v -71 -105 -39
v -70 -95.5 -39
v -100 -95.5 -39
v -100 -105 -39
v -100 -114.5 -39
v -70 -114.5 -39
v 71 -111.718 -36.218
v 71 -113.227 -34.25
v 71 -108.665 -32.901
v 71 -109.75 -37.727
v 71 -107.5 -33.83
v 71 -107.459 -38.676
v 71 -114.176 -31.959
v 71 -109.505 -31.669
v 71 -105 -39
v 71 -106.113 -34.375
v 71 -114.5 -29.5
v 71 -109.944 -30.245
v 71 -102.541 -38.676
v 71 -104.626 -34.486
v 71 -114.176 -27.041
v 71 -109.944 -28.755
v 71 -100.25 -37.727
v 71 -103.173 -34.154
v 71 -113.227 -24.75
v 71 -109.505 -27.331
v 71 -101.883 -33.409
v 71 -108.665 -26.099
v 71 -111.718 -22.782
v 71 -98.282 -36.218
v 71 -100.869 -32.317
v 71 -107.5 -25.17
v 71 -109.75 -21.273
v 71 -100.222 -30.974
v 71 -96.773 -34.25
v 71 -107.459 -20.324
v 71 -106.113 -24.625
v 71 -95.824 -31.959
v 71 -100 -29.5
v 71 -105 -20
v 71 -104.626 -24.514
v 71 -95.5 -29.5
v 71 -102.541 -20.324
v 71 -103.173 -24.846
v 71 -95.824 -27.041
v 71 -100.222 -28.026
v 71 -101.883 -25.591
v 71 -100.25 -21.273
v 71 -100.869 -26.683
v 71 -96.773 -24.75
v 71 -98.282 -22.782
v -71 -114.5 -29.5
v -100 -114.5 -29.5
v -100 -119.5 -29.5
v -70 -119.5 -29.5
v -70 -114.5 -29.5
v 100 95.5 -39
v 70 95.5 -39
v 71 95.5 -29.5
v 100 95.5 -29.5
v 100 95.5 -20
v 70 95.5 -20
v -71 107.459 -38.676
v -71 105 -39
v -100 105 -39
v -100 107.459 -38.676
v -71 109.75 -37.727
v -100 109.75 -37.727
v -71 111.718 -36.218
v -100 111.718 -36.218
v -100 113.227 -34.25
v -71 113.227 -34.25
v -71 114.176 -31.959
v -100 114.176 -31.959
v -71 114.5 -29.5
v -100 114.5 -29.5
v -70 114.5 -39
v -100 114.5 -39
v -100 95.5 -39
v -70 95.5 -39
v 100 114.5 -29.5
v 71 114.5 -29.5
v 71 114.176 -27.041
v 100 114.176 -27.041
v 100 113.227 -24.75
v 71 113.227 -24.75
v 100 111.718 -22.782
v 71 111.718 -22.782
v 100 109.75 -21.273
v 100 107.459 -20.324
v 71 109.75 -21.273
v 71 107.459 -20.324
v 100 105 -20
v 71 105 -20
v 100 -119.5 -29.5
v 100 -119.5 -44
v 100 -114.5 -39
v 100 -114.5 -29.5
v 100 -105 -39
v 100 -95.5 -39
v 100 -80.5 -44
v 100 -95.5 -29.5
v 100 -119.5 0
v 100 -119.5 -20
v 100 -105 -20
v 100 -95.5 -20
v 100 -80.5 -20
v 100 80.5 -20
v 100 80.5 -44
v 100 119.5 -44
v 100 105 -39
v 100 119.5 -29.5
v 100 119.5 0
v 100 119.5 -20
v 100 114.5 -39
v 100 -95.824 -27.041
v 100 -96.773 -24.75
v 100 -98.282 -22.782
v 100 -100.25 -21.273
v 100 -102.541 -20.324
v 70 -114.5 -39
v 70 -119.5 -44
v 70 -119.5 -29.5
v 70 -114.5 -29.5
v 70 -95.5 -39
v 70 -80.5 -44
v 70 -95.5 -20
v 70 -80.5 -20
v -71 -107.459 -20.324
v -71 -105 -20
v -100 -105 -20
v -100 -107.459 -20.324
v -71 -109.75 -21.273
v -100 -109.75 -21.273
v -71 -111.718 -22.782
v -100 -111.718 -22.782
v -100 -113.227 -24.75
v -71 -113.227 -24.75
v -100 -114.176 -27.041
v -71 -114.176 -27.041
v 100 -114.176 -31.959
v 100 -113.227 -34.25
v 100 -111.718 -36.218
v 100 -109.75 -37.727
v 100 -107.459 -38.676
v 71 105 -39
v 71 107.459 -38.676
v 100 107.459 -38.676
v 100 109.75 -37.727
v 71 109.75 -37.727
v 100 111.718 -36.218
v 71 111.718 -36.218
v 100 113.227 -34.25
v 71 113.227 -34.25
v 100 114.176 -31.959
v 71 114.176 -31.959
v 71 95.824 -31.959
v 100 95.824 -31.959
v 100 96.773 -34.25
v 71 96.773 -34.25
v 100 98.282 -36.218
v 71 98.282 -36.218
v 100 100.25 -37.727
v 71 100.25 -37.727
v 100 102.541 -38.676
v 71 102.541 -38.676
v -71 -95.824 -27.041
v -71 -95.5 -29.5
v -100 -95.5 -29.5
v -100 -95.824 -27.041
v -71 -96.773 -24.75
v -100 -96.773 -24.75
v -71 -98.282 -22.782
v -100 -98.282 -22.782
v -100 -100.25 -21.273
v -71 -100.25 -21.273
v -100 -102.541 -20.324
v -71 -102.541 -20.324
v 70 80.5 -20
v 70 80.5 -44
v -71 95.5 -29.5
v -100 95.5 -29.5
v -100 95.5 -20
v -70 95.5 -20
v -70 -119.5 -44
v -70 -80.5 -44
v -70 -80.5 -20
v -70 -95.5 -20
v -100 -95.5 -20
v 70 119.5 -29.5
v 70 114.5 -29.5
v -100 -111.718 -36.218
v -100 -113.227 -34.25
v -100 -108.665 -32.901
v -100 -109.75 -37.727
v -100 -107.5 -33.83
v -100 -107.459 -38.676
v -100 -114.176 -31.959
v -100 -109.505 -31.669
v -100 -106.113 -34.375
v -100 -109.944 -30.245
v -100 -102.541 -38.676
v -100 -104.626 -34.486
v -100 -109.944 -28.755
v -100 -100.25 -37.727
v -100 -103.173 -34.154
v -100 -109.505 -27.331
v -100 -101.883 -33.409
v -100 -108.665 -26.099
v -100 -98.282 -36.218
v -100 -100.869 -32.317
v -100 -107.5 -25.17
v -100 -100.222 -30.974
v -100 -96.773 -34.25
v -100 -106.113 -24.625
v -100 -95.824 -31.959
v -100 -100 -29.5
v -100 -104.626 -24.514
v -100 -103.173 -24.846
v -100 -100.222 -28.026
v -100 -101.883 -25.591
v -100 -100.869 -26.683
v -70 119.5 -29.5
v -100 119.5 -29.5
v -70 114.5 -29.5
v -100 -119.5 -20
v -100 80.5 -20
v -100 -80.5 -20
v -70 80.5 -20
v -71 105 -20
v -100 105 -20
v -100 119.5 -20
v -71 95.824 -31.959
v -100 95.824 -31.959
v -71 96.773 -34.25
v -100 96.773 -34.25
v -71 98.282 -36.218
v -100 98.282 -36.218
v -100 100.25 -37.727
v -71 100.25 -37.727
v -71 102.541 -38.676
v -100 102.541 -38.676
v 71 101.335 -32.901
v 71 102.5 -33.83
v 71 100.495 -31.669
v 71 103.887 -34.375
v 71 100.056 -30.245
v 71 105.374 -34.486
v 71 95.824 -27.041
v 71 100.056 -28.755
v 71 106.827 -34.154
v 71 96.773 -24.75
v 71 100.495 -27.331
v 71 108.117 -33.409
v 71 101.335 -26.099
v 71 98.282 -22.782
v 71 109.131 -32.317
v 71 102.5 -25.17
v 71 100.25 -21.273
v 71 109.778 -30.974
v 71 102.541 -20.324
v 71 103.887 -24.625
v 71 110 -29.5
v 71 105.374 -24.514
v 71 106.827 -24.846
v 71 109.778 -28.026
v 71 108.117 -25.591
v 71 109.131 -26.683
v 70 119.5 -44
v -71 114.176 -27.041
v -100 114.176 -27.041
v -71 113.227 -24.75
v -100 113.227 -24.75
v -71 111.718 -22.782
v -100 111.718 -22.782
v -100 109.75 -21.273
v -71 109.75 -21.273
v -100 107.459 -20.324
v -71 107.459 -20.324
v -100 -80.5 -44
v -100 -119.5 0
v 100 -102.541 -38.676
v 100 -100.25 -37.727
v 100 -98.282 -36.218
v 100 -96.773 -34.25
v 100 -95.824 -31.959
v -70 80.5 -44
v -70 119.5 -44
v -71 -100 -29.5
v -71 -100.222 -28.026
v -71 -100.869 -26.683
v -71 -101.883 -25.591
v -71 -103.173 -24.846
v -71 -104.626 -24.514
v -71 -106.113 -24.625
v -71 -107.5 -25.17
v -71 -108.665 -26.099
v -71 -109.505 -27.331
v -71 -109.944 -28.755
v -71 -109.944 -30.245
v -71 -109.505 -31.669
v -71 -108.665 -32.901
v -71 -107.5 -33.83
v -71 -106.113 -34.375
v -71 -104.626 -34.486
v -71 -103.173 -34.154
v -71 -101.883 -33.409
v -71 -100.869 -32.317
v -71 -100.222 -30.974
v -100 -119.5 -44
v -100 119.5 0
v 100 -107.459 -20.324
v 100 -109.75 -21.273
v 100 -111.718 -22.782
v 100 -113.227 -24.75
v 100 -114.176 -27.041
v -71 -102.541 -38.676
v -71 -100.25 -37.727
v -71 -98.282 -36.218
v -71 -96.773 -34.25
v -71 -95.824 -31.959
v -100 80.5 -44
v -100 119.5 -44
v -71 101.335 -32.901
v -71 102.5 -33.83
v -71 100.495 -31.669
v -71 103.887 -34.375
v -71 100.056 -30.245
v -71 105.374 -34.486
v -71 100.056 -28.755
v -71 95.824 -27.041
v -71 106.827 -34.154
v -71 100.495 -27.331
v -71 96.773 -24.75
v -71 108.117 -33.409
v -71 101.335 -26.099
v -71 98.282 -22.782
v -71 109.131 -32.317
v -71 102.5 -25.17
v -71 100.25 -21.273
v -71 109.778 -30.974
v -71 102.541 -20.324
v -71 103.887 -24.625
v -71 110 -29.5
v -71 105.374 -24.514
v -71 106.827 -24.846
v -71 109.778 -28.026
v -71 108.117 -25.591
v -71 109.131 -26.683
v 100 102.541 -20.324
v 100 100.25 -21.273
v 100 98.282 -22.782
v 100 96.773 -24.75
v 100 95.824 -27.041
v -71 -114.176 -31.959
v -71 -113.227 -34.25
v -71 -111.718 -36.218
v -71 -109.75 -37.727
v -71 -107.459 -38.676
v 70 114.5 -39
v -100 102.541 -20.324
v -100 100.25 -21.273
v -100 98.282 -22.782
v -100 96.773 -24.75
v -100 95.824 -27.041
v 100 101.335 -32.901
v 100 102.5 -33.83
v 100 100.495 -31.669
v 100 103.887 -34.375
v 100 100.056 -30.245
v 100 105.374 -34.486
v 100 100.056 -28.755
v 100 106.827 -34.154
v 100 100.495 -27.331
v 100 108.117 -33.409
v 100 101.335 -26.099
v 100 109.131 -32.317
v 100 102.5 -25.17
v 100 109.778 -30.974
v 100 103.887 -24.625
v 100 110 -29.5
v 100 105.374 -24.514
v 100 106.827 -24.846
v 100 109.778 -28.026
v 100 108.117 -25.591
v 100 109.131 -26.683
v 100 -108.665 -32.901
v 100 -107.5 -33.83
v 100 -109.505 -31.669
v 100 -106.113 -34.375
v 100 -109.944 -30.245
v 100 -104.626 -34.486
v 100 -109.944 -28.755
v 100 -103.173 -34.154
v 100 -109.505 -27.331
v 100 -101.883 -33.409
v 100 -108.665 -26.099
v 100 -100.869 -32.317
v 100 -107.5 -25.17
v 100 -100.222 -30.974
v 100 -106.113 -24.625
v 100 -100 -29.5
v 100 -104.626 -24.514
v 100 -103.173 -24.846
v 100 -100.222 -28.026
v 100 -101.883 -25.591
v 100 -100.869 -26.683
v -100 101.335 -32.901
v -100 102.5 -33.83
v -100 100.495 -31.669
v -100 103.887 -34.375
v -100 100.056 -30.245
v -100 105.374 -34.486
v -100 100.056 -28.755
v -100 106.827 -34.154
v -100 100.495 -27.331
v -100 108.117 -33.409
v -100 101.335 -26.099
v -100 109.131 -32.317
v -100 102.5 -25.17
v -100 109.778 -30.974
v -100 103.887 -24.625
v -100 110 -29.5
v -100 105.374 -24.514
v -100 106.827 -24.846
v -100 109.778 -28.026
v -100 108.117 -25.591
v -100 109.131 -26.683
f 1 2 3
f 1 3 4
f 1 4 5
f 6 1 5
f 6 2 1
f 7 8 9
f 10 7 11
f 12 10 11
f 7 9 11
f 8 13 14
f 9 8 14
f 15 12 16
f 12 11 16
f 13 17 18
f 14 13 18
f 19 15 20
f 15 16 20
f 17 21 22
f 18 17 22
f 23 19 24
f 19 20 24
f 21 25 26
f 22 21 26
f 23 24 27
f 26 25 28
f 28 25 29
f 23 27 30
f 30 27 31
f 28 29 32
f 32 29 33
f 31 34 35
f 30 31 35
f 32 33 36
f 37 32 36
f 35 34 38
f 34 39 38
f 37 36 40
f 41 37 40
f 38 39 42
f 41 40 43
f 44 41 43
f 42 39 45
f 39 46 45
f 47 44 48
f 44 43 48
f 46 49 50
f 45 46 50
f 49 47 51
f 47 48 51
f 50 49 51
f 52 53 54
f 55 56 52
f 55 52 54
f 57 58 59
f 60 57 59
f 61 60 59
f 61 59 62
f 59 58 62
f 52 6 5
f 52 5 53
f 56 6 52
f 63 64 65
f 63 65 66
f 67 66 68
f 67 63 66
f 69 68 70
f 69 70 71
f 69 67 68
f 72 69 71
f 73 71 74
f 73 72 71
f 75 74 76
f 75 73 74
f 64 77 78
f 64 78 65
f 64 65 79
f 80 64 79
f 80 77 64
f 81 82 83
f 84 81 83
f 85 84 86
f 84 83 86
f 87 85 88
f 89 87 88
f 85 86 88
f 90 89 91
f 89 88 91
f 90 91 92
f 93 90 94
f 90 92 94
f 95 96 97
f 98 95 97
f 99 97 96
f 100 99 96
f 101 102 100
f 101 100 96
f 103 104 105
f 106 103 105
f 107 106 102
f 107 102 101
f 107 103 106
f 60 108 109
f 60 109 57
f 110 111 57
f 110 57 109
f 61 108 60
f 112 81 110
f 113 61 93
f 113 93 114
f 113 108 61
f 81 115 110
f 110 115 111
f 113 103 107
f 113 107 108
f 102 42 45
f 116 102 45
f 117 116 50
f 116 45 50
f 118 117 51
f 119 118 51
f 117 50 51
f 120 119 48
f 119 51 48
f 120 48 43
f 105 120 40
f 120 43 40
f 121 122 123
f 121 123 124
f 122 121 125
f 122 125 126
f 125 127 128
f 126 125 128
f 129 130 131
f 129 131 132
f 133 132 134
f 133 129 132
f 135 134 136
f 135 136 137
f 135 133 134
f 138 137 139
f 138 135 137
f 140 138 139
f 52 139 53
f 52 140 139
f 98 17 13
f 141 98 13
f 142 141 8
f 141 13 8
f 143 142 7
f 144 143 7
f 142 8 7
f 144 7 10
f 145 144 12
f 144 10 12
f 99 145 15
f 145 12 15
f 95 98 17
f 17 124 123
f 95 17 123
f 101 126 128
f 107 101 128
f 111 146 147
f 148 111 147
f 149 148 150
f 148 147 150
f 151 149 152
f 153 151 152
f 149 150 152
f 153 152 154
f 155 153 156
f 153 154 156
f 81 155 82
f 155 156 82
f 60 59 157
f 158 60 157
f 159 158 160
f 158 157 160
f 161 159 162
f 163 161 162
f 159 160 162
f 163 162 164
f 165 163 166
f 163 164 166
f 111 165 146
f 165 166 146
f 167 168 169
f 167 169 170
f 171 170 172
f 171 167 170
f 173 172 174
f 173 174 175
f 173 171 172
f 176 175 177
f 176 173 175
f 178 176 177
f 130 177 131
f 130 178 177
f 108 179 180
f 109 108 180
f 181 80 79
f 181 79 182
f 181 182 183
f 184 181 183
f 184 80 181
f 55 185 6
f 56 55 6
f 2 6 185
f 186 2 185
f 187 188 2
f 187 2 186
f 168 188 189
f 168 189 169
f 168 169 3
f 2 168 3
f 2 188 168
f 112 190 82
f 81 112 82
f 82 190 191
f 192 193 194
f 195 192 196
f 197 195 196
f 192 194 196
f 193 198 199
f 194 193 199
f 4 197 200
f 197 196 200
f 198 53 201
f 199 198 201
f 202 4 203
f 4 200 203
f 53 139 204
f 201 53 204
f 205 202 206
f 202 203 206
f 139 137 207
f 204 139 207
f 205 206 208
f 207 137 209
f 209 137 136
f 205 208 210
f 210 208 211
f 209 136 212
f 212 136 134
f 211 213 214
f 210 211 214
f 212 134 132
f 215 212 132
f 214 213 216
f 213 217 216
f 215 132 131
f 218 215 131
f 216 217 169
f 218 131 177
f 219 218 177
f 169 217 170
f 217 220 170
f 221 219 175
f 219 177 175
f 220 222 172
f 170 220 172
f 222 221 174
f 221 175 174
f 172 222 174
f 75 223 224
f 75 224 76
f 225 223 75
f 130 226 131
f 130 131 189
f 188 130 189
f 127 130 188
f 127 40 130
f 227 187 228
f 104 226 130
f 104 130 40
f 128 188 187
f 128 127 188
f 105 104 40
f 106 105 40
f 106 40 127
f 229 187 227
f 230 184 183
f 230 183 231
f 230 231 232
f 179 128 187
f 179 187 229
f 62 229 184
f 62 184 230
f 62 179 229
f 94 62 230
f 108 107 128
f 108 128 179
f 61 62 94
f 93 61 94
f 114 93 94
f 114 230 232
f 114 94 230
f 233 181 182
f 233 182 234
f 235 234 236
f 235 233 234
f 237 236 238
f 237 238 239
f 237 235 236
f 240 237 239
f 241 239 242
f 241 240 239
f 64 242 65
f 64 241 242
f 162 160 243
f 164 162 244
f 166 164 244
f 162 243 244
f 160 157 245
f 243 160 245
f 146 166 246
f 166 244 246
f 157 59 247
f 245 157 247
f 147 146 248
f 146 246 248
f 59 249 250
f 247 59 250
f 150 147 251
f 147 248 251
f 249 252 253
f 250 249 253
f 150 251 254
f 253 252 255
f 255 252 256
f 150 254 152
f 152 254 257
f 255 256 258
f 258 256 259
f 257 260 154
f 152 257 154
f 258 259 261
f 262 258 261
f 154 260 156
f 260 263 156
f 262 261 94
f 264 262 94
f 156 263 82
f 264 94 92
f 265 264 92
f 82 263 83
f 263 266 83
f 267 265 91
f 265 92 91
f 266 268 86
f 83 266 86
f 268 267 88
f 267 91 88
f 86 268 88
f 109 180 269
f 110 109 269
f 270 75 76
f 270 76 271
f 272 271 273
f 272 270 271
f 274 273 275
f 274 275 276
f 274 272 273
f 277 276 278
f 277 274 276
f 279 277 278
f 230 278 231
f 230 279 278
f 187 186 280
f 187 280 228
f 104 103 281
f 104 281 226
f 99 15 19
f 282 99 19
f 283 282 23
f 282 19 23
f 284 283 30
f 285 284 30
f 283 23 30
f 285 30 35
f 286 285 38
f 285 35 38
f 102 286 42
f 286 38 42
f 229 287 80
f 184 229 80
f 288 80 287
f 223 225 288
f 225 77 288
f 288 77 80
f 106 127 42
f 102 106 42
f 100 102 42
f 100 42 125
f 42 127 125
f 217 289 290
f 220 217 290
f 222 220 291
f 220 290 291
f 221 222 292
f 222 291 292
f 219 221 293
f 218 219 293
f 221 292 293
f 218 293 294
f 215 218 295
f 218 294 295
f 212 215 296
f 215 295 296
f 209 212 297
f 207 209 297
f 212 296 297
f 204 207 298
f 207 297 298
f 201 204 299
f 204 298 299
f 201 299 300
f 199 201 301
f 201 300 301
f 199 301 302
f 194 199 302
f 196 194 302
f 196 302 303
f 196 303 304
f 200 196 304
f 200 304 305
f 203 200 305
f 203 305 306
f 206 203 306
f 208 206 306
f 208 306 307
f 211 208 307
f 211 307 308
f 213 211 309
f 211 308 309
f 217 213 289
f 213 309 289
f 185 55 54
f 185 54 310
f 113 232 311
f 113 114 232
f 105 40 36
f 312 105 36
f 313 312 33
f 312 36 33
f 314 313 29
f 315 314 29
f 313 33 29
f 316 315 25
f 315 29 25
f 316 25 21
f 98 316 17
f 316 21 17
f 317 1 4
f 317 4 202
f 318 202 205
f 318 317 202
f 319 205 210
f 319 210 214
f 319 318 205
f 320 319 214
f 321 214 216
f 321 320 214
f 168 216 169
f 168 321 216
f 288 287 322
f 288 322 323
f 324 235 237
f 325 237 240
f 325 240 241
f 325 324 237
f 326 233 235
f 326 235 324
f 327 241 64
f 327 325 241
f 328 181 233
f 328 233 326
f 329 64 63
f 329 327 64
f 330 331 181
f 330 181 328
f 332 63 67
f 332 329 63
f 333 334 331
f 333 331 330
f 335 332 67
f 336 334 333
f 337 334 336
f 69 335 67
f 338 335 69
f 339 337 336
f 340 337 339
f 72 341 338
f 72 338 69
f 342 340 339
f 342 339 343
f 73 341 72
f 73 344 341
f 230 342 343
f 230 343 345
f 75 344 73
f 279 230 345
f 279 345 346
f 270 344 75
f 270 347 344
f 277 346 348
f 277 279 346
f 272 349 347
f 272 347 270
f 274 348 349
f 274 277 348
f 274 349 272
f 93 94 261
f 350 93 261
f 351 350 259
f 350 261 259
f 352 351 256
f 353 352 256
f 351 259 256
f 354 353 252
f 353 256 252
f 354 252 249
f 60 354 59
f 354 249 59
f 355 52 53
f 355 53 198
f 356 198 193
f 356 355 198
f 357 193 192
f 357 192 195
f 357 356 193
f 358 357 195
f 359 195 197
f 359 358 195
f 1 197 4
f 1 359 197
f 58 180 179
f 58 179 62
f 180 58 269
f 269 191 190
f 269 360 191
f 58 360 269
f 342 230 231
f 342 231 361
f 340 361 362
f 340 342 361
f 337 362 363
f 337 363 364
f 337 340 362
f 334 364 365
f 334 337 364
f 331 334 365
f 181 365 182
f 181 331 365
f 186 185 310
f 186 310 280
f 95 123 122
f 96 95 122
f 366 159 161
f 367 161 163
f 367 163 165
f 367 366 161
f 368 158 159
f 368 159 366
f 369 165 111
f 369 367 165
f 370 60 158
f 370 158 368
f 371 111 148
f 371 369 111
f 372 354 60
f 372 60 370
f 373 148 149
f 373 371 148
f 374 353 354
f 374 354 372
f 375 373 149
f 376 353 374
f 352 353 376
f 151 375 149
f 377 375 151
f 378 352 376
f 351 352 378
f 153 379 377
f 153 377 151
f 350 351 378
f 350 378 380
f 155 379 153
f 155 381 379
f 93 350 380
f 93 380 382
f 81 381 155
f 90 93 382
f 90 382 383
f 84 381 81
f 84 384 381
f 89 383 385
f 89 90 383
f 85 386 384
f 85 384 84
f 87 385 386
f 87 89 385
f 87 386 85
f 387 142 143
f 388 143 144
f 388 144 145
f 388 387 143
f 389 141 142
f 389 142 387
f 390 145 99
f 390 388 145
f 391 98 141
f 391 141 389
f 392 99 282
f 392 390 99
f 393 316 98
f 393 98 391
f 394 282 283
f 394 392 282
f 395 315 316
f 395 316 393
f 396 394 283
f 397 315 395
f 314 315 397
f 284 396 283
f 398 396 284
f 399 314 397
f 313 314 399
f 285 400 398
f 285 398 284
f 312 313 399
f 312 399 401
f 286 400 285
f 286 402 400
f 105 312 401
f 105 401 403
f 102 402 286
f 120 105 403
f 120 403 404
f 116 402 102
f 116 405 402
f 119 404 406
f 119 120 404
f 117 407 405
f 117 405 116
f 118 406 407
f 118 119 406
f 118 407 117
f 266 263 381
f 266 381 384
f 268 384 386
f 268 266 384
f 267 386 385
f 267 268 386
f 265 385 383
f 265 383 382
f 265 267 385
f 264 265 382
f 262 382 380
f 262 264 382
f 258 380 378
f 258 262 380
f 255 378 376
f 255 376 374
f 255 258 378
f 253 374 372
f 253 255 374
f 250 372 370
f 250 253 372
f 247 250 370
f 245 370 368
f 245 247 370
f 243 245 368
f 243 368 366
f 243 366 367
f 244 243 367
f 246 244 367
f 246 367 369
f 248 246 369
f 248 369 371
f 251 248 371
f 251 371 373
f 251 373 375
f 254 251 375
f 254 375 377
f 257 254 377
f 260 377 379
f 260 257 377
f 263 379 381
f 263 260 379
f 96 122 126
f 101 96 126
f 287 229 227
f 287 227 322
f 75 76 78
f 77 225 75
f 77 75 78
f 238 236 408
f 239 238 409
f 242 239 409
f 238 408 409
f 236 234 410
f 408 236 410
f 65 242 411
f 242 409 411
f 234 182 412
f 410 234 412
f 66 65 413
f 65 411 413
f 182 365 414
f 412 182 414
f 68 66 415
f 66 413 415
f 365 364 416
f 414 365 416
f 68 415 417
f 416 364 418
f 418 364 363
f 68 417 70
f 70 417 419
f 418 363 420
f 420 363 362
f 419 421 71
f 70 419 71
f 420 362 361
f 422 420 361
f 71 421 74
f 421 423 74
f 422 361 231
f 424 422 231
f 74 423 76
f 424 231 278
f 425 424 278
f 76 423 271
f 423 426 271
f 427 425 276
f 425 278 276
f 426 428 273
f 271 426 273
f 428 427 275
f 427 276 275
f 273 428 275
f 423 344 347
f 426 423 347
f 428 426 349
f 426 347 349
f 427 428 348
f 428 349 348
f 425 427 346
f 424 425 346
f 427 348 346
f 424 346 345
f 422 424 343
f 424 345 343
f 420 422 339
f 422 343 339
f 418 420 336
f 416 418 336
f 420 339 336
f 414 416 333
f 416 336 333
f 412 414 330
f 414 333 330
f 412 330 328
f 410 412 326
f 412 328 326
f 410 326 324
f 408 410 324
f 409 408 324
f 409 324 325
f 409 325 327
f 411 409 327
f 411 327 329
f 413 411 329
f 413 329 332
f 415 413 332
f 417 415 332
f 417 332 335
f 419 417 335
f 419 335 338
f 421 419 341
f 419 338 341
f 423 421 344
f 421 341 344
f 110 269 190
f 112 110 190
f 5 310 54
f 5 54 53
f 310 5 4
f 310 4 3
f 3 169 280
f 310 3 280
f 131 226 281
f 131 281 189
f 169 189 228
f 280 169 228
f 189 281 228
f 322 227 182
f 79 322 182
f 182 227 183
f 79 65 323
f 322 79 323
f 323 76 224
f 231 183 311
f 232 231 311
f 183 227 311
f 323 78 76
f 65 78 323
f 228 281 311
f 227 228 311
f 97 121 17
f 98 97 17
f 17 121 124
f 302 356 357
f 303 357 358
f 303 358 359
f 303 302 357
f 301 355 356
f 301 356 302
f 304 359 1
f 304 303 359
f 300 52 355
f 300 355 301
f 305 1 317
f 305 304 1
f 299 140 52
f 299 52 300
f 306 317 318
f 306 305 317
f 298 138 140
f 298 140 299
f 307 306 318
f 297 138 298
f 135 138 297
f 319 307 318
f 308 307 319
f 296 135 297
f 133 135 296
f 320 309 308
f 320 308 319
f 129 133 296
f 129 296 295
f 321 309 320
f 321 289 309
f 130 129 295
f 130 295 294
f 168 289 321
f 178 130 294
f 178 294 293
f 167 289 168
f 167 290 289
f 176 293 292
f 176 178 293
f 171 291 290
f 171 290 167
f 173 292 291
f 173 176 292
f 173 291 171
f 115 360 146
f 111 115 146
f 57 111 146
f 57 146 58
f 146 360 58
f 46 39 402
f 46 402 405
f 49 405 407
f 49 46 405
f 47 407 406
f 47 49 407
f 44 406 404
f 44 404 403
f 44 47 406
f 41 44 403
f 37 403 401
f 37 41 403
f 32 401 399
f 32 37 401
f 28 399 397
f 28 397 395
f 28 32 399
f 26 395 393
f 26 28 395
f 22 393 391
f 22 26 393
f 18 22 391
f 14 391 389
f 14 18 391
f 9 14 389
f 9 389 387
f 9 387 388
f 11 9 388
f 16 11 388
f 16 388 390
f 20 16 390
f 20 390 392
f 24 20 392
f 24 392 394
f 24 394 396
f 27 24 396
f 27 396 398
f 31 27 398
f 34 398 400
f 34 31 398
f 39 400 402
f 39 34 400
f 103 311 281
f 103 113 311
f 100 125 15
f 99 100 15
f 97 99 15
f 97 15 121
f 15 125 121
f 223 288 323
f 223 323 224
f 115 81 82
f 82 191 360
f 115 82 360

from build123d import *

# Parameters (mm, degrees)
F1_DEPTH = 100
F2_START = 71
F0_R     = 5
F2_DEPTH = 29
F3_START = 70
F3_DEPTH = 30


with BuildPart() as f1:
    # F0 (on Right) → F1 (new body, symmetric)
    with BuildSketch(Plane.YZ):
        Polygon((119.5, 0), (-119.5, 0), (-119.5, -20), (-105, -20), (-95.5, -20), (-80.5, -20), (80.5, -20), (95.5, -20), (105, -20), (119.5, -20), align=None)
    extrude(amount=F1_DEPTH, both=True)

    # F0 (on Right) → F2 (join)
    with BuildSketch(Plane.YZ.offset(F2_START)):
        with BuildLine():
            ThreePointArc((-95.5, -29.5), (-98.2824855787, -22.7824855787), (-105, -20))
            ThreePointArc((-105, -20), (-111.7175144213, -22.7824855787), (-114.5, -29.5))
            ThreePointArc((-114.5, -29.5), (-111.7175144213, -36.2175144213), (-105, -39))
            ThreePointArc((-105, -39), (-98.2824855787, -36.2175144213), (-95.5, -29.5))
        make_face()
        with Locations((-105, -29.5)):
            Circle(F0_R, mode=Mode.SUBTRACT)
        with BuildLine():
            ThreePointArc((114.5, -29.5), (111.7175144213, -22.7824855787), (105, -20))
            ThreePointArc((105, -20), (98.2824855787, -22.7824855787), (95.5, -29.5))
            ThreePointArc((95.5, -29.5), (98.2824855787, -36.2175144213), (105, -39))
            ThreePointArc((105, -39), (111.7175144213, -36.2175144213), (114.5, -29.5))
        make_face()
        with Locations((105, -29.5)):
            Circle(F0_R, mode=Mode.SUBTRACT)
    extrude(amount=F2_DEPTH)



with BuildPart() as f3:
    # F0 (on Right) → F3 (new body)
    with BuildSketch(Plane.YZ.offset(F3_START)):
        Polygon((-80.5, -20), (-95.5, -20), (-95.5, -29.5), (-95.5, -39), (-105, -39), (-114.5, -39), (-114.5, -29.5), (-119.5, -29.5), (-119.5, -44), (-80.5, -44), align=None)
    extrude(amount=F3_DEPTH)


with BuildPart() as f3b:
    # F0 (on Right) → F3, piece 2 (new body)
    with BuildSketch(Plane.YZ.offset(F3_START)):
        Polygon((95.5, -29.5), (95.5, -20), (80.5, -20), (80.5, -44), (119.5, -44), (119.5, -29.5), (114.5, -29.5), (114.5, -39), (105, -39), (95.5, -39), align=None)
    extrude(amount=F3_DEPTH)


with BuildPart() as f1_1:
    add(f1.part)

    add(f3.part)  # F4 merges F3

    add(f3b.part)  # F4 merges F3b
    # F4: F3, F1, F3b across plane
    add(f3.part.mirror(Plane.YZ))
    add(f1.part.mirror(Plane.YZ))
    add(f3b.part.mirror(Plane.YZ))


solid = f1_1.part
